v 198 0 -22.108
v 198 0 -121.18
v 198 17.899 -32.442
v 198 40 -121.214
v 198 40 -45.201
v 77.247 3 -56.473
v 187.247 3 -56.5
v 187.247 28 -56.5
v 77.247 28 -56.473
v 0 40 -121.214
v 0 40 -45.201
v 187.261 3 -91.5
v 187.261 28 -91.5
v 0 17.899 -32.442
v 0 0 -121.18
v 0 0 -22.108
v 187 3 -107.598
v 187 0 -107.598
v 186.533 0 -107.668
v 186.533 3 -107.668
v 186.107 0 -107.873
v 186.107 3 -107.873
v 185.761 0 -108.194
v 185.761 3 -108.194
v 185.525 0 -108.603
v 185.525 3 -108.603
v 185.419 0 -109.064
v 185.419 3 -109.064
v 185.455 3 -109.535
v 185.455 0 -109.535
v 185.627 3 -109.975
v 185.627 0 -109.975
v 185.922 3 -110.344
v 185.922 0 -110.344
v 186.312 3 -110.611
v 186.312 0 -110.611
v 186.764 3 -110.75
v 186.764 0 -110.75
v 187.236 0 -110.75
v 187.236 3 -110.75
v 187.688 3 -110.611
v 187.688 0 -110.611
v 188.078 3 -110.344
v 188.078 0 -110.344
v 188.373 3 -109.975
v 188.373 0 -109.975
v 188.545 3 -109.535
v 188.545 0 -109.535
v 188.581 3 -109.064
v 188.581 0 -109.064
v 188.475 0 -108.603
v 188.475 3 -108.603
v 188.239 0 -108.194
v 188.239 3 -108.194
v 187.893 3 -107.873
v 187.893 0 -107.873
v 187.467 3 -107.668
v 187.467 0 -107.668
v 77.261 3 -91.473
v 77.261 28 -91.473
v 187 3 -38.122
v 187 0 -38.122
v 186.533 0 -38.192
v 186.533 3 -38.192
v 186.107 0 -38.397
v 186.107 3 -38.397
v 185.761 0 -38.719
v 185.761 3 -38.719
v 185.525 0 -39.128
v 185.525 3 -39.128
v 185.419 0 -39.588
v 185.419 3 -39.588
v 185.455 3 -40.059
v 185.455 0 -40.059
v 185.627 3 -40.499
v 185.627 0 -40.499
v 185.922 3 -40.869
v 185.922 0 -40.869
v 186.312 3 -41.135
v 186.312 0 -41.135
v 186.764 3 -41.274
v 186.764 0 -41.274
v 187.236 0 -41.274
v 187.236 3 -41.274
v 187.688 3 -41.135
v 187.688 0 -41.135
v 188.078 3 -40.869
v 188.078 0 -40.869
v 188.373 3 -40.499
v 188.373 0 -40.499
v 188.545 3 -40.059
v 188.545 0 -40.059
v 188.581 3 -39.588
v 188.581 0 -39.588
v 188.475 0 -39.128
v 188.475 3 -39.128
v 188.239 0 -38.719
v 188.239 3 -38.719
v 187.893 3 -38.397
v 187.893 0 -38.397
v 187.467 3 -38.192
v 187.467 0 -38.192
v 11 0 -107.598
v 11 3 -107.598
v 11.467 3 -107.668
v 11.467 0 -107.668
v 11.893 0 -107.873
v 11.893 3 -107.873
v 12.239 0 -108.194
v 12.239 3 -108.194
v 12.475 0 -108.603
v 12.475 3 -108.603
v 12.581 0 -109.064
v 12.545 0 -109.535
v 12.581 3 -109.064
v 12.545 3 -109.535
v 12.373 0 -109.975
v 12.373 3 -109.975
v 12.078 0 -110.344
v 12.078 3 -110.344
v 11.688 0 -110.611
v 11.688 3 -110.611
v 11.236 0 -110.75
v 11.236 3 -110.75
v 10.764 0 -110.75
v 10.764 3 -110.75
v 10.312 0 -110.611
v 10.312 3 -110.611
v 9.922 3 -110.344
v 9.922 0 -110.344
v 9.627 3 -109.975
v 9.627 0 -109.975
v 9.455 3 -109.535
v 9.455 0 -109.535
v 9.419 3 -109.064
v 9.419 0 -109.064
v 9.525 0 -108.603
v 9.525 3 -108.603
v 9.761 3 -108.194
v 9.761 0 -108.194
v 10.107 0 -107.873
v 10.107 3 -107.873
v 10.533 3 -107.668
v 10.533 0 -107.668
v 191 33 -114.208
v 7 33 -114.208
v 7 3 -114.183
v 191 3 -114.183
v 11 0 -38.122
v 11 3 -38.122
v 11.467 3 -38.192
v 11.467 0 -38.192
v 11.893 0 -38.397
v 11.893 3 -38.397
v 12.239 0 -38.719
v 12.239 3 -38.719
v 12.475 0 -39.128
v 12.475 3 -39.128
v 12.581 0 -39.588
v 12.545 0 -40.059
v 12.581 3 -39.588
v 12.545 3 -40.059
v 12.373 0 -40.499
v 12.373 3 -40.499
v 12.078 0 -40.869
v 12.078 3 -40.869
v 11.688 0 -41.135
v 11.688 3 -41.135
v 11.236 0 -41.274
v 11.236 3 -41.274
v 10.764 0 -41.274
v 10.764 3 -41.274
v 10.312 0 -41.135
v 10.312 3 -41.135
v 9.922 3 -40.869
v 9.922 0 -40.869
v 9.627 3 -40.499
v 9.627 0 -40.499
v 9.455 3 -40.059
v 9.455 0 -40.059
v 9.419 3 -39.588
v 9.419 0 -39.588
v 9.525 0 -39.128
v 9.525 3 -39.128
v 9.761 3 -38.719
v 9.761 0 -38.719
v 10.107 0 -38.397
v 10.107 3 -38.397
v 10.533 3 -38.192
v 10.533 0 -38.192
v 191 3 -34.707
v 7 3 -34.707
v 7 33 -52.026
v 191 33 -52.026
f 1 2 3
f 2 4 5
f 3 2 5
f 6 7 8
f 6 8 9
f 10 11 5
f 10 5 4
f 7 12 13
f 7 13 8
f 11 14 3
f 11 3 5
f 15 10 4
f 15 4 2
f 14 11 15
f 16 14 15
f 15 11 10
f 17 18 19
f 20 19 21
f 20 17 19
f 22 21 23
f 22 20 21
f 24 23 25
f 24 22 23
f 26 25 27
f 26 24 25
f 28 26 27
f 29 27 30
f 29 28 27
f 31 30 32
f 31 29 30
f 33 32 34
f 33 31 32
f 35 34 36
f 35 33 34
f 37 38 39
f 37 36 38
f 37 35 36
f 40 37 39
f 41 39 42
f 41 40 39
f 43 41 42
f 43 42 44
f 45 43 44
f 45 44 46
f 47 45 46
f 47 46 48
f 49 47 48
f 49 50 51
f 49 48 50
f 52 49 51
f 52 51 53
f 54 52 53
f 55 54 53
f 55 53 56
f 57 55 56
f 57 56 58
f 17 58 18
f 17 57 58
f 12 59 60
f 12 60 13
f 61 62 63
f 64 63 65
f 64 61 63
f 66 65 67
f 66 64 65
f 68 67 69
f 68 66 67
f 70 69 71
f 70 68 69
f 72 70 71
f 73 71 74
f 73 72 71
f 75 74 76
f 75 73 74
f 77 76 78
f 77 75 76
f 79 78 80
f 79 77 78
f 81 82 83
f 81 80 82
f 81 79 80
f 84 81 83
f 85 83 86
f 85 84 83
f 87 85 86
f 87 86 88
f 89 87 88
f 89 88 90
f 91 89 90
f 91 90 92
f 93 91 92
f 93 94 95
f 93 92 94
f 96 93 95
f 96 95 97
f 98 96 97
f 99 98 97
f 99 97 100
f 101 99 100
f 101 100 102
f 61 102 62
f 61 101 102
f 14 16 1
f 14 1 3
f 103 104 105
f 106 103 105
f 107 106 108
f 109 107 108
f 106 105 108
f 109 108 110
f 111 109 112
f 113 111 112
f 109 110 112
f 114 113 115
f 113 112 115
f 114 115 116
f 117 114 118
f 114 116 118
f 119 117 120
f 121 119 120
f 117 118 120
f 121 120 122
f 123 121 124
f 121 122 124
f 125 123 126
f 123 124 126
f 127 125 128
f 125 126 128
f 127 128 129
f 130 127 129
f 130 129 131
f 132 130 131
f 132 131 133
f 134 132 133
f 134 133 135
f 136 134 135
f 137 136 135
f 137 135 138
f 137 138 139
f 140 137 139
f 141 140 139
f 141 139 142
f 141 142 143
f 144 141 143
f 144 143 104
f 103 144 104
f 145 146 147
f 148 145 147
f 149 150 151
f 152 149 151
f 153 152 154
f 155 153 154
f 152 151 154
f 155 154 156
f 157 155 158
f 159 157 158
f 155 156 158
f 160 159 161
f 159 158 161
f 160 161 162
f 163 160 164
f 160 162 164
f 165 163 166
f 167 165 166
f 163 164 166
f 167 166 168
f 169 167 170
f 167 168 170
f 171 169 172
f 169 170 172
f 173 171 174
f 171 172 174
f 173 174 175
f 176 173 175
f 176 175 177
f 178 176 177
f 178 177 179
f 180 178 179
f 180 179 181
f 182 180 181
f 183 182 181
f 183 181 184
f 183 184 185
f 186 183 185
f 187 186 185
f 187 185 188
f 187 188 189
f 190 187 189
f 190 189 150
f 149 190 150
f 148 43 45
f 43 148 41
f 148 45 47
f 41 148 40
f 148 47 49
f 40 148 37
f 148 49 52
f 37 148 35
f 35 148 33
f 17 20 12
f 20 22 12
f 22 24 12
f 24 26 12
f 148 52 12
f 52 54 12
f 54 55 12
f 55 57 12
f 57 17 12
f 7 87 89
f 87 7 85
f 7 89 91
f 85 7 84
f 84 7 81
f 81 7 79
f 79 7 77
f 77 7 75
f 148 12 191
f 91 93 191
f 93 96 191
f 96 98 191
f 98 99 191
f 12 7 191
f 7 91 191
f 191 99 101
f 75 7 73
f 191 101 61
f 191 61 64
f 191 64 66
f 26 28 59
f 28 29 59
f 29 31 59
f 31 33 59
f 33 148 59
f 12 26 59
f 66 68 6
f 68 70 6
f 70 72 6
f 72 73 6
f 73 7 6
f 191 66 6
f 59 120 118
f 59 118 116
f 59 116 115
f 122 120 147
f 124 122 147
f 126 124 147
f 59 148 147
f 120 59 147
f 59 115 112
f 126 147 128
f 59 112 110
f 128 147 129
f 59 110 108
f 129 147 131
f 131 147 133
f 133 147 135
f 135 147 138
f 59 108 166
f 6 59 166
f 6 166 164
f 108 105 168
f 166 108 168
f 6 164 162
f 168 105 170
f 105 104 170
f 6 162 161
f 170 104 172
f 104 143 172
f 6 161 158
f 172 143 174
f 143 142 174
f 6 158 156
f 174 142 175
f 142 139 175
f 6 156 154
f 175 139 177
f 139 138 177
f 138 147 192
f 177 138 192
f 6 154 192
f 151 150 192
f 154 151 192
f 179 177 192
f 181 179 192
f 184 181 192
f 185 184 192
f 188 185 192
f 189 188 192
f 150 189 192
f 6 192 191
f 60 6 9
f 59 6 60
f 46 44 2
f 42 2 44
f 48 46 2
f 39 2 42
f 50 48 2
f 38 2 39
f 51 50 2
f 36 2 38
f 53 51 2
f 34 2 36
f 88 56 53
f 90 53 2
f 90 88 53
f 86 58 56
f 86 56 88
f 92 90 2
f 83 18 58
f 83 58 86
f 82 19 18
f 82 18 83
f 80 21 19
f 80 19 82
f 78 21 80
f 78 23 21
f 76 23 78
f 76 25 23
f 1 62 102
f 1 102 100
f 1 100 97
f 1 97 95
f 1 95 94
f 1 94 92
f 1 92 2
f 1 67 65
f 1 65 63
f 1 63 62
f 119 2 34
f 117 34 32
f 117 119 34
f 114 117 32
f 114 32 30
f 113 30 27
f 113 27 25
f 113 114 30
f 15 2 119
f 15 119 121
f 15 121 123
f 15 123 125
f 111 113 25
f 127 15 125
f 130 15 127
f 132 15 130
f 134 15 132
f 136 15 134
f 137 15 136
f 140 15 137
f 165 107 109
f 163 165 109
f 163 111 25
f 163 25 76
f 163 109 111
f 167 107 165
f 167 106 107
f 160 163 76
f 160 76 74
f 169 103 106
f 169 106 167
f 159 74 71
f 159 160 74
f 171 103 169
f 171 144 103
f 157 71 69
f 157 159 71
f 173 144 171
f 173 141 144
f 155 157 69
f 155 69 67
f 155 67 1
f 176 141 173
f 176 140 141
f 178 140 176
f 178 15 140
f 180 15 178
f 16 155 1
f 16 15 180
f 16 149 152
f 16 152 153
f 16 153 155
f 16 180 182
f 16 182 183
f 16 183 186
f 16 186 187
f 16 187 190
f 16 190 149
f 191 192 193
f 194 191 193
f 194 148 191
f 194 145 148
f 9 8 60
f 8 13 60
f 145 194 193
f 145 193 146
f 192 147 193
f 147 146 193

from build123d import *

# Parameters (mm, degrees)
BOSS_EXTRUDE1_DEPTH = 198
SHELL1_T            = -7
BOSS_EXTRUDE2_DEPTH = 191
SKETCH3_W           = 95.245639834
SKETCH3_H           = 3
BOSS_EXTRUDE3_DEPTH = 191
SKETCH4_R           = 1.585
CUT_EXTRUDE1_DEPTH  = 5
BOSS_EXTRUDE4_DEPTH = 25


with BuildPart() as part:
    # Sketch1 → Boss-Extrude1 (new body)
    with BuildSketch(Plane(origin=(0, 0, 0), x_dir=(0, 0, -1), z_dir=(1, 0, 0))):
        Polygon((22.10846405, 0), (32.441807929, 17.899216821), (45.200737204, 39.99998538), (121.214199537, 39.99998538), (121.18, 0), align=None)
    extrude(amount=BOSS_EXTRUDE1_DEPTH)

    # Shell1
    shell1_openings = [part.faces().sort_by_distance(p)[0] for p in [
        (99, 0, -71.644232025),
    ]]
    offset(amount=SHELL1_T, openings=shell1_openings, kind=Kind.INTERSECTION)

    # Sketch2 → Boss-Extrude2 (add)
    with BuildSketch(Plane.ZY):
        Polygon((-30.191216521, 0), (-32.974854852, 0), (-52.025978727, 32.99998538), (-49.242340395, 32.99998538), align=None)
    extrude(amount=-BOSS_EXTRUDE2_DEPTH)

    # Sketch3 → Boss-Extrude3 (add)
    with BuildSketch(Plane.ZY):
        with Locations((-73.557180083, 1.5)):
            Rectangle(SKETCH3_W, SKETCH3_H)
    extrude(amount=-BOSS_EXTRUDE3_DEPTH)

    # Sketch4 → Cut-Extrude1 (cut)
    with BuildSketch(Plane(origin=(0, 3, 0), x_dir=(1, 0, 0), z_dir=(0, 1, 0))):
        with Locations(Location((11, 109.182562408, 0), (0, 0, 270))):
            Circle(SKETCH4_R)
        with Locations(Location((11, 39.706775972, 0), (0, 0, 270))):
            Circle(SKETCH4_R)
    cut_extrude1 = extrude(amount=-CUT_EXTRUDE1_DEPTH, mode=Mode.SUBTRACT)

    # Mirror1: Cut-Extrude1 across plane
    add(cut_extrude1.mirror(Plane(origin=(99, 0, 0), x_dir=(0, 0, 1), z_dir=(1, 0, 0))), mode=Mode.SUBTRACT)

    # Sketch5 → Boss-Extrude4 (add)
    with BuildSketch(Plane(origin=(0, 3, 0), x_dir=(1, 0, 0), z_dir=(0, 1, 0))):
        Polygon((187.246573538, 56.499587918), (77.246576653, 56.473406784), (77.260934082, 91.473403839), (187.260930967, 91.499584973), align=None)
    extrude(amount=BOSS_EXTRUDE4_DEPTH)


solid = part.part
